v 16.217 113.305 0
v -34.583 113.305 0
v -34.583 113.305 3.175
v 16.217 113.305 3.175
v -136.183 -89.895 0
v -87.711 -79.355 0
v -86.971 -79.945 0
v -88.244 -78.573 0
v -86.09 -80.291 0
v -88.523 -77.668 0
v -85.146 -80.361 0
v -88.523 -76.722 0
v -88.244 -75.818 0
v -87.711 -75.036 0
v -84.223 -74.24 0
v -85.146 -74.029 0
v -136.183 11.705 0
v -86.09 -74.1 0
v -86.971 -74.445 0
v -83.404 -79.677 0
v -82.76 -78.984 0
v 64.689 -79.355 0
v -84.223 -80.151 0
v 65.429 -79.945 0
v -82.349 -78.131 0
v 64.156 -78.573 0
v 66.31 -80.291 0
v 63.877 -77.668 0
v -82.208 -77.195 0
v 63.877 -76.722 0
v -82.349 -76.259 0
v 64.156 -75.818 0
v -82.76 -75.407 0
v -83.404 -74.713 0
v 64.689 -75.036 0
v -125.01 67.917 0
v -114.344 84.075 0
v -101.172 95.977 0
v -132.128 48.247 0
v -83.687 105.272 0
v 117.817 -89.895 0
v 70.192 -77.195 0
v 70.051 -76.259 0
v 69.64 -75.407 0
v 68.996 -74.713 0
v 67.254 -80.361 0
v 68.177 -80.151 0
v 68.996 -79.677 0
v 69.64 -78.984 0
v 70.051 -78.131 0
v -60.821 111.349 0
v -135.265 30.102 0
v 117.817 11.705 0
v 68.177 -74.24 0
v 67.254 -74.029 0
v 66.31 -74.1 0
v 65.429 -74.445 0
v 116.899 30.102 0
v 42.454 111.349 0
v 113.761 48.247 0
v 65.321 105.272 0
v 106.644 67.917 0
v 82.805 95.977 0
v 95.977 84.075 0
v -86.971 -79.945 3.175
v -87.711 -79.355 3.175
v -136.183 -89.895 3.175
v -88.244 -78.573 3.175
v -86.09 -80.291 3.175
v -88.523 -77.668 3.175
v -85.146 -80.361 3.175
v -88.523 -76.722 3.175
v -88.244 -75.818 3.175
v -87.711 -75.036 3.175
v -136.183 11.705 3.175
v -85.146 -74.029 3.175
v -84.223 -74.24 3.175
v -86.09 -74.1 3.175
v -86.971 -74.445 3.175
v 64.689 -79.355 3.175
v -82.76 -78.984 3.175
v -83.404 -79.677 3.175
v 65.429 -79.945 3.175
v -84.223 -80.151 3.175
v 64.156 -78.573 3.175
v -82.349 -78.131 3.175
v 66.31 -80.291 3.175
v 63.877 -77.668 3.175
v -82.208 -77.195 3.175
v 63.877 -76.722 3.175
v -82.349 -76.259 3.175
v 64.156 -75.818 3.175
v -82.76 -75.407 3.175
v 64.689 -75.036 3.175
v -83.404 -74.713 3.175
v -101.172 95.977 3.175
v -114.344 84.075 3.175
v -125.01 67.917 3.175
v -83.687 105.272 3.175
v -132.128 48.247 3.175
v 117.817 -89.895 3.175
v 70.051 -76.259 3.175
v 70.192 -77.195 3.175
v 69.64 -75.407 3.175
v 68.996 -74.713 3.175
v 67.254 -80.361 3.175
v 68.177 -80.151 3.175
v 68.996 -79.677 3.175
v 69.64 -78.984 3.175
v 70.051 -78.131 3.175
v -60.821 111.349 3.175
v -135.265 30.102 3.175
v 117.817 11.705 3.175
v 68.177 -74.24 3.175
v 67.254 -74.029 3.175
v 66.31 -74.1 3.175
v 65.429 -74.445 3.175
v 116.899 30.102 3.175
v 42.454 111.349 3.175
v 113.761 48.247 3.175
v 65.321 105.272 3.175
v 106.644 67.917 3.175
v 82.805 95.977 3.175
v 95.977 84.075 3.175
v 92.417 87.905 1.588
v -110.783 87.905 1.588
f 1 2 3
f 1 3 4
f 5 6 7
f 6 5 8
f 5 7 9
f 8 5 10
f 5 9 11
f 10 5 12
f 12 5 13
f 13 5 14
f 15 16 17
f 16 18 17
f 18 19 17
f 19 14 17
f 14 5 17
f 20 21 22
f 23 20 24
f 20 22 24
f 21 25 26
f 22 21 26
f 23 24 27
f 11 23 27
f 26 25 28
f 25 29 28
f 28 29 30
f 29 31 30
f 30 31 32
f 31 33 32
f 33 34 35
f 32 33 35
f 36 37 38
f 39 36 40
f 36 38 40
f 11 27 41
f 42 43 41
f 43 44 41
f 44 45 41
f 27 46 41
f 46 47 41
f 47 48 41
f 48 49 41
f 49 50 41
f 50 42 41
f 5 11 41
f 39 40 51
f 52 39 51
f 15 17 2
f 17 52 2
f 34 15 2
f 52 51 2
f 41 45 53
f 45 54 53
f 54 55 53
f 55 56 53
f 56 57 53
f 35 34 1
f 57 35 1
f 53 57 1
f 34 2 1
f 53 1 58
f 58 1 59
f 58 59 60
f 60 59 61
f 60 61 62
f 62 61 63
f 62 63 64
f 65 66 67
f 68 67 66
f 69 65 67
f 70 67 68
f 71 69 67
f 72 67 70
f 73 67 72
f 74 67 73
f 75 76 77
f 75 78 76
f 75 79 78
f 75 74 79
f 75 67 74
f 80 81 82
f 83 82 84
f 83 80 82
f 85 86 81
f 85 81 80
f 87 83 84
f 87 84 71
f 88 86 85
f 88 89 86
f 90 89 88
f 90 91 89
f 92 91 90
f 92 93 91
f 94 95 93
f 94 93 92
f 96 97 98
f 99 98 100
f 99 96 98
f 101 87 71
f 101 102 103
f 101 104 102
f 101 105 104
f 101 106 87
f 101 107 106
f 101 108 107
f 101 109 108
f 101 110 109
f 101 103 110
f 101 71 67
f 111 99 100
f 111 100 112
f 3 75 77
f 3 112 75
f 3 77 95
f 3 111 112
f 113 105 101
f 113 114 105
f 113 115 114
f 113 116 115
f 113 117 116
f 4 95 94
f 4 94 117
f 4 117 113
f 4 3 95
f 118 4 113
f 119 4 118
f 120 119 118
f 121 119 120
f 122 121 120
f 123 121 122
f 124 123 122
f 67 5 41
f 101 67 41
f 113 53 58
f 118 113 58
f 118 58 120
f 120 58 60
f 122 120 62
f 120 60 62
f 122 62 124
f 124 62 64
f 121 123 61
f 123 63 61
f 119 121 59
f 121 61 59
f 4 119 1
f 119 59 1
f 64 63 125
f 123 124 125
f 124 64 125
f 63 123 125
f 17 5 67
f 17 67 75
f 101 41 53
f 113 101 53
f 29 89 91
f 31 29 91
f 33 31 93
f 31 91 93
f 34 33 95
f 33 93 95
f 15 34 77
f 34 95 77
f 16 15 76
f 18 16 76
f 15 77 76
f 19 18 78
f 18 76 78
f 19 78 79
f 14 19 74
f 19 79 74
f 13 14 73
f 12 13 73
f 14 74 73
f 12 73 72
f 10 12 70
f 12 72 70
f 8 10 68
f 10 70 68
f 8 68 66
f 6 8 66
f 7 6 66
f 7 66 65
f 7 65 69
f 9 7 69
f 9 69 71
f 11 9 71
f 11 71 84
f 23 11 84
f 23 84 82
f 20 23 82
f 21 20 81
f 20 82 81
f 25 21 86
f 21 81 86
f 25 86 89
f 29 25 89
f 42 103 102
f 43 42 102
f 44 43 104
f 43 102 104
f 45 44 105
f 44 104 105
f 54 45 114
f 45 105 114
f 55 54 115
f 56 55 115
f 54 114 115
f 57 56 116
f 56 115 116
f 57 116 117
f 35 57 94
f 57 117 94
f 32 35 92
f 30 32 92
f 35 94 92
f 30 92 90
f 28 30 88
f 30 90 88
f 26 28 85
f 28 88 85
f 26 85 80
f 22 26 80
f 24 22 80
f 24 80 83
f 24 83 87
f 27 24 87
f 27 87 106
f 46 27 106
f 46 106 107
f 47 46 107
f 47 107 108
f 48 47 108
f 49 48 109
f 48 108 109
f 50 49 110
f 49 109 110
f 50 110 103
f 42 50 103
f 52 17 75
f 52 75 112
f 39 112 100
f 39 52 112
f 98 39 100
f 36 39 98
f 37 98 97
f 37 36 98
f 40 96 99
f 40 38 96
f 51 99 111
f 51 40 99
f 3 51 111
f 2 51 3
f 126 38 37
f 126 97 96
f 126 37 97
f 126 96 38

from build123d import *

# Parameters (mm, degrees)
F0_W        = 254
F0_H        = 203.2
F1_DEPTH    = 3.175
F2_T1_DEPTH = 511.175
F3_R        = 3.175
F4_DEPTH    = 3.175


# Not quite as in the source:
# - a fillet or chamfer that OpenCascade refuses, or shapes differently, is made with other operations: its cross-section is extruded or revolved along the edge and cut away or added


with BuildPart() as f1:
    # F0 (on Top) → F1 (new body)
    with BuildSketch(Plane.XY):
        with Locations((-9.1833584011, 11.7048747692)):
            Rectangle(F0_W, F0_H)
    extrude(amount=F1_DEPTH)

    # F2: fillet of radius 101.6 on 2 edges, made by hand

    # F2_s2 → F2_t1 (cut)
    with BuildSketch(Plane.XY.offset(-254)):
        with BuildLine():
            add(Edge.make_bspline(
                [(-136.1833584011, 11.7048747692), (-136.1833584011, 113.3048747692), (-34.5833584011, 113.3048747692)],
                knots=[0, 0, 0, 1, 1, 1], degree=2, weights=[1, 1, 1]))
            Line((-34.5833584011, 113.3048747692), (-136.1833584011, 113.3048747692))
            Line((-136.1833584011, 113.3048747692), (-136.1833584011, 11.7048747692))
        make_face()
        with BuildLine():
            add(Edge.make_bspline(
                [(117.8166415989, 11.7048747692), (117.8166415989, 113.3048747692), (16.2166415989, 113.3048747692)],
                knots=[0, 0, 0, 1, 1, 1], degree=2, weights=[1, 1, 1]))
            Line((16.2166415989, 113.3048747692), (117.8166415989, 113.3048747692))
            Line((117.8166415989, 113.3048747692), (117.8166415989, 11.7048747692))
        make_face()
    extrude(amount=F2_T1_DEPTH, mode=Mode.SUBTRACT)

    # F3 (on face) → F4 (cut)
    with BuildSketch(Plane.XY.offset(3.175)):
        with Locations((-85.3833584011, -77.1951252308)):
            Circle(F3_R)
        with Locations((67.0166415989, -77.1951252308)):
            Circle(F3_R)
    extrude(amount=-F4_DEPTH, mode=Mode.SUBTRACT)


solid = f1.part
